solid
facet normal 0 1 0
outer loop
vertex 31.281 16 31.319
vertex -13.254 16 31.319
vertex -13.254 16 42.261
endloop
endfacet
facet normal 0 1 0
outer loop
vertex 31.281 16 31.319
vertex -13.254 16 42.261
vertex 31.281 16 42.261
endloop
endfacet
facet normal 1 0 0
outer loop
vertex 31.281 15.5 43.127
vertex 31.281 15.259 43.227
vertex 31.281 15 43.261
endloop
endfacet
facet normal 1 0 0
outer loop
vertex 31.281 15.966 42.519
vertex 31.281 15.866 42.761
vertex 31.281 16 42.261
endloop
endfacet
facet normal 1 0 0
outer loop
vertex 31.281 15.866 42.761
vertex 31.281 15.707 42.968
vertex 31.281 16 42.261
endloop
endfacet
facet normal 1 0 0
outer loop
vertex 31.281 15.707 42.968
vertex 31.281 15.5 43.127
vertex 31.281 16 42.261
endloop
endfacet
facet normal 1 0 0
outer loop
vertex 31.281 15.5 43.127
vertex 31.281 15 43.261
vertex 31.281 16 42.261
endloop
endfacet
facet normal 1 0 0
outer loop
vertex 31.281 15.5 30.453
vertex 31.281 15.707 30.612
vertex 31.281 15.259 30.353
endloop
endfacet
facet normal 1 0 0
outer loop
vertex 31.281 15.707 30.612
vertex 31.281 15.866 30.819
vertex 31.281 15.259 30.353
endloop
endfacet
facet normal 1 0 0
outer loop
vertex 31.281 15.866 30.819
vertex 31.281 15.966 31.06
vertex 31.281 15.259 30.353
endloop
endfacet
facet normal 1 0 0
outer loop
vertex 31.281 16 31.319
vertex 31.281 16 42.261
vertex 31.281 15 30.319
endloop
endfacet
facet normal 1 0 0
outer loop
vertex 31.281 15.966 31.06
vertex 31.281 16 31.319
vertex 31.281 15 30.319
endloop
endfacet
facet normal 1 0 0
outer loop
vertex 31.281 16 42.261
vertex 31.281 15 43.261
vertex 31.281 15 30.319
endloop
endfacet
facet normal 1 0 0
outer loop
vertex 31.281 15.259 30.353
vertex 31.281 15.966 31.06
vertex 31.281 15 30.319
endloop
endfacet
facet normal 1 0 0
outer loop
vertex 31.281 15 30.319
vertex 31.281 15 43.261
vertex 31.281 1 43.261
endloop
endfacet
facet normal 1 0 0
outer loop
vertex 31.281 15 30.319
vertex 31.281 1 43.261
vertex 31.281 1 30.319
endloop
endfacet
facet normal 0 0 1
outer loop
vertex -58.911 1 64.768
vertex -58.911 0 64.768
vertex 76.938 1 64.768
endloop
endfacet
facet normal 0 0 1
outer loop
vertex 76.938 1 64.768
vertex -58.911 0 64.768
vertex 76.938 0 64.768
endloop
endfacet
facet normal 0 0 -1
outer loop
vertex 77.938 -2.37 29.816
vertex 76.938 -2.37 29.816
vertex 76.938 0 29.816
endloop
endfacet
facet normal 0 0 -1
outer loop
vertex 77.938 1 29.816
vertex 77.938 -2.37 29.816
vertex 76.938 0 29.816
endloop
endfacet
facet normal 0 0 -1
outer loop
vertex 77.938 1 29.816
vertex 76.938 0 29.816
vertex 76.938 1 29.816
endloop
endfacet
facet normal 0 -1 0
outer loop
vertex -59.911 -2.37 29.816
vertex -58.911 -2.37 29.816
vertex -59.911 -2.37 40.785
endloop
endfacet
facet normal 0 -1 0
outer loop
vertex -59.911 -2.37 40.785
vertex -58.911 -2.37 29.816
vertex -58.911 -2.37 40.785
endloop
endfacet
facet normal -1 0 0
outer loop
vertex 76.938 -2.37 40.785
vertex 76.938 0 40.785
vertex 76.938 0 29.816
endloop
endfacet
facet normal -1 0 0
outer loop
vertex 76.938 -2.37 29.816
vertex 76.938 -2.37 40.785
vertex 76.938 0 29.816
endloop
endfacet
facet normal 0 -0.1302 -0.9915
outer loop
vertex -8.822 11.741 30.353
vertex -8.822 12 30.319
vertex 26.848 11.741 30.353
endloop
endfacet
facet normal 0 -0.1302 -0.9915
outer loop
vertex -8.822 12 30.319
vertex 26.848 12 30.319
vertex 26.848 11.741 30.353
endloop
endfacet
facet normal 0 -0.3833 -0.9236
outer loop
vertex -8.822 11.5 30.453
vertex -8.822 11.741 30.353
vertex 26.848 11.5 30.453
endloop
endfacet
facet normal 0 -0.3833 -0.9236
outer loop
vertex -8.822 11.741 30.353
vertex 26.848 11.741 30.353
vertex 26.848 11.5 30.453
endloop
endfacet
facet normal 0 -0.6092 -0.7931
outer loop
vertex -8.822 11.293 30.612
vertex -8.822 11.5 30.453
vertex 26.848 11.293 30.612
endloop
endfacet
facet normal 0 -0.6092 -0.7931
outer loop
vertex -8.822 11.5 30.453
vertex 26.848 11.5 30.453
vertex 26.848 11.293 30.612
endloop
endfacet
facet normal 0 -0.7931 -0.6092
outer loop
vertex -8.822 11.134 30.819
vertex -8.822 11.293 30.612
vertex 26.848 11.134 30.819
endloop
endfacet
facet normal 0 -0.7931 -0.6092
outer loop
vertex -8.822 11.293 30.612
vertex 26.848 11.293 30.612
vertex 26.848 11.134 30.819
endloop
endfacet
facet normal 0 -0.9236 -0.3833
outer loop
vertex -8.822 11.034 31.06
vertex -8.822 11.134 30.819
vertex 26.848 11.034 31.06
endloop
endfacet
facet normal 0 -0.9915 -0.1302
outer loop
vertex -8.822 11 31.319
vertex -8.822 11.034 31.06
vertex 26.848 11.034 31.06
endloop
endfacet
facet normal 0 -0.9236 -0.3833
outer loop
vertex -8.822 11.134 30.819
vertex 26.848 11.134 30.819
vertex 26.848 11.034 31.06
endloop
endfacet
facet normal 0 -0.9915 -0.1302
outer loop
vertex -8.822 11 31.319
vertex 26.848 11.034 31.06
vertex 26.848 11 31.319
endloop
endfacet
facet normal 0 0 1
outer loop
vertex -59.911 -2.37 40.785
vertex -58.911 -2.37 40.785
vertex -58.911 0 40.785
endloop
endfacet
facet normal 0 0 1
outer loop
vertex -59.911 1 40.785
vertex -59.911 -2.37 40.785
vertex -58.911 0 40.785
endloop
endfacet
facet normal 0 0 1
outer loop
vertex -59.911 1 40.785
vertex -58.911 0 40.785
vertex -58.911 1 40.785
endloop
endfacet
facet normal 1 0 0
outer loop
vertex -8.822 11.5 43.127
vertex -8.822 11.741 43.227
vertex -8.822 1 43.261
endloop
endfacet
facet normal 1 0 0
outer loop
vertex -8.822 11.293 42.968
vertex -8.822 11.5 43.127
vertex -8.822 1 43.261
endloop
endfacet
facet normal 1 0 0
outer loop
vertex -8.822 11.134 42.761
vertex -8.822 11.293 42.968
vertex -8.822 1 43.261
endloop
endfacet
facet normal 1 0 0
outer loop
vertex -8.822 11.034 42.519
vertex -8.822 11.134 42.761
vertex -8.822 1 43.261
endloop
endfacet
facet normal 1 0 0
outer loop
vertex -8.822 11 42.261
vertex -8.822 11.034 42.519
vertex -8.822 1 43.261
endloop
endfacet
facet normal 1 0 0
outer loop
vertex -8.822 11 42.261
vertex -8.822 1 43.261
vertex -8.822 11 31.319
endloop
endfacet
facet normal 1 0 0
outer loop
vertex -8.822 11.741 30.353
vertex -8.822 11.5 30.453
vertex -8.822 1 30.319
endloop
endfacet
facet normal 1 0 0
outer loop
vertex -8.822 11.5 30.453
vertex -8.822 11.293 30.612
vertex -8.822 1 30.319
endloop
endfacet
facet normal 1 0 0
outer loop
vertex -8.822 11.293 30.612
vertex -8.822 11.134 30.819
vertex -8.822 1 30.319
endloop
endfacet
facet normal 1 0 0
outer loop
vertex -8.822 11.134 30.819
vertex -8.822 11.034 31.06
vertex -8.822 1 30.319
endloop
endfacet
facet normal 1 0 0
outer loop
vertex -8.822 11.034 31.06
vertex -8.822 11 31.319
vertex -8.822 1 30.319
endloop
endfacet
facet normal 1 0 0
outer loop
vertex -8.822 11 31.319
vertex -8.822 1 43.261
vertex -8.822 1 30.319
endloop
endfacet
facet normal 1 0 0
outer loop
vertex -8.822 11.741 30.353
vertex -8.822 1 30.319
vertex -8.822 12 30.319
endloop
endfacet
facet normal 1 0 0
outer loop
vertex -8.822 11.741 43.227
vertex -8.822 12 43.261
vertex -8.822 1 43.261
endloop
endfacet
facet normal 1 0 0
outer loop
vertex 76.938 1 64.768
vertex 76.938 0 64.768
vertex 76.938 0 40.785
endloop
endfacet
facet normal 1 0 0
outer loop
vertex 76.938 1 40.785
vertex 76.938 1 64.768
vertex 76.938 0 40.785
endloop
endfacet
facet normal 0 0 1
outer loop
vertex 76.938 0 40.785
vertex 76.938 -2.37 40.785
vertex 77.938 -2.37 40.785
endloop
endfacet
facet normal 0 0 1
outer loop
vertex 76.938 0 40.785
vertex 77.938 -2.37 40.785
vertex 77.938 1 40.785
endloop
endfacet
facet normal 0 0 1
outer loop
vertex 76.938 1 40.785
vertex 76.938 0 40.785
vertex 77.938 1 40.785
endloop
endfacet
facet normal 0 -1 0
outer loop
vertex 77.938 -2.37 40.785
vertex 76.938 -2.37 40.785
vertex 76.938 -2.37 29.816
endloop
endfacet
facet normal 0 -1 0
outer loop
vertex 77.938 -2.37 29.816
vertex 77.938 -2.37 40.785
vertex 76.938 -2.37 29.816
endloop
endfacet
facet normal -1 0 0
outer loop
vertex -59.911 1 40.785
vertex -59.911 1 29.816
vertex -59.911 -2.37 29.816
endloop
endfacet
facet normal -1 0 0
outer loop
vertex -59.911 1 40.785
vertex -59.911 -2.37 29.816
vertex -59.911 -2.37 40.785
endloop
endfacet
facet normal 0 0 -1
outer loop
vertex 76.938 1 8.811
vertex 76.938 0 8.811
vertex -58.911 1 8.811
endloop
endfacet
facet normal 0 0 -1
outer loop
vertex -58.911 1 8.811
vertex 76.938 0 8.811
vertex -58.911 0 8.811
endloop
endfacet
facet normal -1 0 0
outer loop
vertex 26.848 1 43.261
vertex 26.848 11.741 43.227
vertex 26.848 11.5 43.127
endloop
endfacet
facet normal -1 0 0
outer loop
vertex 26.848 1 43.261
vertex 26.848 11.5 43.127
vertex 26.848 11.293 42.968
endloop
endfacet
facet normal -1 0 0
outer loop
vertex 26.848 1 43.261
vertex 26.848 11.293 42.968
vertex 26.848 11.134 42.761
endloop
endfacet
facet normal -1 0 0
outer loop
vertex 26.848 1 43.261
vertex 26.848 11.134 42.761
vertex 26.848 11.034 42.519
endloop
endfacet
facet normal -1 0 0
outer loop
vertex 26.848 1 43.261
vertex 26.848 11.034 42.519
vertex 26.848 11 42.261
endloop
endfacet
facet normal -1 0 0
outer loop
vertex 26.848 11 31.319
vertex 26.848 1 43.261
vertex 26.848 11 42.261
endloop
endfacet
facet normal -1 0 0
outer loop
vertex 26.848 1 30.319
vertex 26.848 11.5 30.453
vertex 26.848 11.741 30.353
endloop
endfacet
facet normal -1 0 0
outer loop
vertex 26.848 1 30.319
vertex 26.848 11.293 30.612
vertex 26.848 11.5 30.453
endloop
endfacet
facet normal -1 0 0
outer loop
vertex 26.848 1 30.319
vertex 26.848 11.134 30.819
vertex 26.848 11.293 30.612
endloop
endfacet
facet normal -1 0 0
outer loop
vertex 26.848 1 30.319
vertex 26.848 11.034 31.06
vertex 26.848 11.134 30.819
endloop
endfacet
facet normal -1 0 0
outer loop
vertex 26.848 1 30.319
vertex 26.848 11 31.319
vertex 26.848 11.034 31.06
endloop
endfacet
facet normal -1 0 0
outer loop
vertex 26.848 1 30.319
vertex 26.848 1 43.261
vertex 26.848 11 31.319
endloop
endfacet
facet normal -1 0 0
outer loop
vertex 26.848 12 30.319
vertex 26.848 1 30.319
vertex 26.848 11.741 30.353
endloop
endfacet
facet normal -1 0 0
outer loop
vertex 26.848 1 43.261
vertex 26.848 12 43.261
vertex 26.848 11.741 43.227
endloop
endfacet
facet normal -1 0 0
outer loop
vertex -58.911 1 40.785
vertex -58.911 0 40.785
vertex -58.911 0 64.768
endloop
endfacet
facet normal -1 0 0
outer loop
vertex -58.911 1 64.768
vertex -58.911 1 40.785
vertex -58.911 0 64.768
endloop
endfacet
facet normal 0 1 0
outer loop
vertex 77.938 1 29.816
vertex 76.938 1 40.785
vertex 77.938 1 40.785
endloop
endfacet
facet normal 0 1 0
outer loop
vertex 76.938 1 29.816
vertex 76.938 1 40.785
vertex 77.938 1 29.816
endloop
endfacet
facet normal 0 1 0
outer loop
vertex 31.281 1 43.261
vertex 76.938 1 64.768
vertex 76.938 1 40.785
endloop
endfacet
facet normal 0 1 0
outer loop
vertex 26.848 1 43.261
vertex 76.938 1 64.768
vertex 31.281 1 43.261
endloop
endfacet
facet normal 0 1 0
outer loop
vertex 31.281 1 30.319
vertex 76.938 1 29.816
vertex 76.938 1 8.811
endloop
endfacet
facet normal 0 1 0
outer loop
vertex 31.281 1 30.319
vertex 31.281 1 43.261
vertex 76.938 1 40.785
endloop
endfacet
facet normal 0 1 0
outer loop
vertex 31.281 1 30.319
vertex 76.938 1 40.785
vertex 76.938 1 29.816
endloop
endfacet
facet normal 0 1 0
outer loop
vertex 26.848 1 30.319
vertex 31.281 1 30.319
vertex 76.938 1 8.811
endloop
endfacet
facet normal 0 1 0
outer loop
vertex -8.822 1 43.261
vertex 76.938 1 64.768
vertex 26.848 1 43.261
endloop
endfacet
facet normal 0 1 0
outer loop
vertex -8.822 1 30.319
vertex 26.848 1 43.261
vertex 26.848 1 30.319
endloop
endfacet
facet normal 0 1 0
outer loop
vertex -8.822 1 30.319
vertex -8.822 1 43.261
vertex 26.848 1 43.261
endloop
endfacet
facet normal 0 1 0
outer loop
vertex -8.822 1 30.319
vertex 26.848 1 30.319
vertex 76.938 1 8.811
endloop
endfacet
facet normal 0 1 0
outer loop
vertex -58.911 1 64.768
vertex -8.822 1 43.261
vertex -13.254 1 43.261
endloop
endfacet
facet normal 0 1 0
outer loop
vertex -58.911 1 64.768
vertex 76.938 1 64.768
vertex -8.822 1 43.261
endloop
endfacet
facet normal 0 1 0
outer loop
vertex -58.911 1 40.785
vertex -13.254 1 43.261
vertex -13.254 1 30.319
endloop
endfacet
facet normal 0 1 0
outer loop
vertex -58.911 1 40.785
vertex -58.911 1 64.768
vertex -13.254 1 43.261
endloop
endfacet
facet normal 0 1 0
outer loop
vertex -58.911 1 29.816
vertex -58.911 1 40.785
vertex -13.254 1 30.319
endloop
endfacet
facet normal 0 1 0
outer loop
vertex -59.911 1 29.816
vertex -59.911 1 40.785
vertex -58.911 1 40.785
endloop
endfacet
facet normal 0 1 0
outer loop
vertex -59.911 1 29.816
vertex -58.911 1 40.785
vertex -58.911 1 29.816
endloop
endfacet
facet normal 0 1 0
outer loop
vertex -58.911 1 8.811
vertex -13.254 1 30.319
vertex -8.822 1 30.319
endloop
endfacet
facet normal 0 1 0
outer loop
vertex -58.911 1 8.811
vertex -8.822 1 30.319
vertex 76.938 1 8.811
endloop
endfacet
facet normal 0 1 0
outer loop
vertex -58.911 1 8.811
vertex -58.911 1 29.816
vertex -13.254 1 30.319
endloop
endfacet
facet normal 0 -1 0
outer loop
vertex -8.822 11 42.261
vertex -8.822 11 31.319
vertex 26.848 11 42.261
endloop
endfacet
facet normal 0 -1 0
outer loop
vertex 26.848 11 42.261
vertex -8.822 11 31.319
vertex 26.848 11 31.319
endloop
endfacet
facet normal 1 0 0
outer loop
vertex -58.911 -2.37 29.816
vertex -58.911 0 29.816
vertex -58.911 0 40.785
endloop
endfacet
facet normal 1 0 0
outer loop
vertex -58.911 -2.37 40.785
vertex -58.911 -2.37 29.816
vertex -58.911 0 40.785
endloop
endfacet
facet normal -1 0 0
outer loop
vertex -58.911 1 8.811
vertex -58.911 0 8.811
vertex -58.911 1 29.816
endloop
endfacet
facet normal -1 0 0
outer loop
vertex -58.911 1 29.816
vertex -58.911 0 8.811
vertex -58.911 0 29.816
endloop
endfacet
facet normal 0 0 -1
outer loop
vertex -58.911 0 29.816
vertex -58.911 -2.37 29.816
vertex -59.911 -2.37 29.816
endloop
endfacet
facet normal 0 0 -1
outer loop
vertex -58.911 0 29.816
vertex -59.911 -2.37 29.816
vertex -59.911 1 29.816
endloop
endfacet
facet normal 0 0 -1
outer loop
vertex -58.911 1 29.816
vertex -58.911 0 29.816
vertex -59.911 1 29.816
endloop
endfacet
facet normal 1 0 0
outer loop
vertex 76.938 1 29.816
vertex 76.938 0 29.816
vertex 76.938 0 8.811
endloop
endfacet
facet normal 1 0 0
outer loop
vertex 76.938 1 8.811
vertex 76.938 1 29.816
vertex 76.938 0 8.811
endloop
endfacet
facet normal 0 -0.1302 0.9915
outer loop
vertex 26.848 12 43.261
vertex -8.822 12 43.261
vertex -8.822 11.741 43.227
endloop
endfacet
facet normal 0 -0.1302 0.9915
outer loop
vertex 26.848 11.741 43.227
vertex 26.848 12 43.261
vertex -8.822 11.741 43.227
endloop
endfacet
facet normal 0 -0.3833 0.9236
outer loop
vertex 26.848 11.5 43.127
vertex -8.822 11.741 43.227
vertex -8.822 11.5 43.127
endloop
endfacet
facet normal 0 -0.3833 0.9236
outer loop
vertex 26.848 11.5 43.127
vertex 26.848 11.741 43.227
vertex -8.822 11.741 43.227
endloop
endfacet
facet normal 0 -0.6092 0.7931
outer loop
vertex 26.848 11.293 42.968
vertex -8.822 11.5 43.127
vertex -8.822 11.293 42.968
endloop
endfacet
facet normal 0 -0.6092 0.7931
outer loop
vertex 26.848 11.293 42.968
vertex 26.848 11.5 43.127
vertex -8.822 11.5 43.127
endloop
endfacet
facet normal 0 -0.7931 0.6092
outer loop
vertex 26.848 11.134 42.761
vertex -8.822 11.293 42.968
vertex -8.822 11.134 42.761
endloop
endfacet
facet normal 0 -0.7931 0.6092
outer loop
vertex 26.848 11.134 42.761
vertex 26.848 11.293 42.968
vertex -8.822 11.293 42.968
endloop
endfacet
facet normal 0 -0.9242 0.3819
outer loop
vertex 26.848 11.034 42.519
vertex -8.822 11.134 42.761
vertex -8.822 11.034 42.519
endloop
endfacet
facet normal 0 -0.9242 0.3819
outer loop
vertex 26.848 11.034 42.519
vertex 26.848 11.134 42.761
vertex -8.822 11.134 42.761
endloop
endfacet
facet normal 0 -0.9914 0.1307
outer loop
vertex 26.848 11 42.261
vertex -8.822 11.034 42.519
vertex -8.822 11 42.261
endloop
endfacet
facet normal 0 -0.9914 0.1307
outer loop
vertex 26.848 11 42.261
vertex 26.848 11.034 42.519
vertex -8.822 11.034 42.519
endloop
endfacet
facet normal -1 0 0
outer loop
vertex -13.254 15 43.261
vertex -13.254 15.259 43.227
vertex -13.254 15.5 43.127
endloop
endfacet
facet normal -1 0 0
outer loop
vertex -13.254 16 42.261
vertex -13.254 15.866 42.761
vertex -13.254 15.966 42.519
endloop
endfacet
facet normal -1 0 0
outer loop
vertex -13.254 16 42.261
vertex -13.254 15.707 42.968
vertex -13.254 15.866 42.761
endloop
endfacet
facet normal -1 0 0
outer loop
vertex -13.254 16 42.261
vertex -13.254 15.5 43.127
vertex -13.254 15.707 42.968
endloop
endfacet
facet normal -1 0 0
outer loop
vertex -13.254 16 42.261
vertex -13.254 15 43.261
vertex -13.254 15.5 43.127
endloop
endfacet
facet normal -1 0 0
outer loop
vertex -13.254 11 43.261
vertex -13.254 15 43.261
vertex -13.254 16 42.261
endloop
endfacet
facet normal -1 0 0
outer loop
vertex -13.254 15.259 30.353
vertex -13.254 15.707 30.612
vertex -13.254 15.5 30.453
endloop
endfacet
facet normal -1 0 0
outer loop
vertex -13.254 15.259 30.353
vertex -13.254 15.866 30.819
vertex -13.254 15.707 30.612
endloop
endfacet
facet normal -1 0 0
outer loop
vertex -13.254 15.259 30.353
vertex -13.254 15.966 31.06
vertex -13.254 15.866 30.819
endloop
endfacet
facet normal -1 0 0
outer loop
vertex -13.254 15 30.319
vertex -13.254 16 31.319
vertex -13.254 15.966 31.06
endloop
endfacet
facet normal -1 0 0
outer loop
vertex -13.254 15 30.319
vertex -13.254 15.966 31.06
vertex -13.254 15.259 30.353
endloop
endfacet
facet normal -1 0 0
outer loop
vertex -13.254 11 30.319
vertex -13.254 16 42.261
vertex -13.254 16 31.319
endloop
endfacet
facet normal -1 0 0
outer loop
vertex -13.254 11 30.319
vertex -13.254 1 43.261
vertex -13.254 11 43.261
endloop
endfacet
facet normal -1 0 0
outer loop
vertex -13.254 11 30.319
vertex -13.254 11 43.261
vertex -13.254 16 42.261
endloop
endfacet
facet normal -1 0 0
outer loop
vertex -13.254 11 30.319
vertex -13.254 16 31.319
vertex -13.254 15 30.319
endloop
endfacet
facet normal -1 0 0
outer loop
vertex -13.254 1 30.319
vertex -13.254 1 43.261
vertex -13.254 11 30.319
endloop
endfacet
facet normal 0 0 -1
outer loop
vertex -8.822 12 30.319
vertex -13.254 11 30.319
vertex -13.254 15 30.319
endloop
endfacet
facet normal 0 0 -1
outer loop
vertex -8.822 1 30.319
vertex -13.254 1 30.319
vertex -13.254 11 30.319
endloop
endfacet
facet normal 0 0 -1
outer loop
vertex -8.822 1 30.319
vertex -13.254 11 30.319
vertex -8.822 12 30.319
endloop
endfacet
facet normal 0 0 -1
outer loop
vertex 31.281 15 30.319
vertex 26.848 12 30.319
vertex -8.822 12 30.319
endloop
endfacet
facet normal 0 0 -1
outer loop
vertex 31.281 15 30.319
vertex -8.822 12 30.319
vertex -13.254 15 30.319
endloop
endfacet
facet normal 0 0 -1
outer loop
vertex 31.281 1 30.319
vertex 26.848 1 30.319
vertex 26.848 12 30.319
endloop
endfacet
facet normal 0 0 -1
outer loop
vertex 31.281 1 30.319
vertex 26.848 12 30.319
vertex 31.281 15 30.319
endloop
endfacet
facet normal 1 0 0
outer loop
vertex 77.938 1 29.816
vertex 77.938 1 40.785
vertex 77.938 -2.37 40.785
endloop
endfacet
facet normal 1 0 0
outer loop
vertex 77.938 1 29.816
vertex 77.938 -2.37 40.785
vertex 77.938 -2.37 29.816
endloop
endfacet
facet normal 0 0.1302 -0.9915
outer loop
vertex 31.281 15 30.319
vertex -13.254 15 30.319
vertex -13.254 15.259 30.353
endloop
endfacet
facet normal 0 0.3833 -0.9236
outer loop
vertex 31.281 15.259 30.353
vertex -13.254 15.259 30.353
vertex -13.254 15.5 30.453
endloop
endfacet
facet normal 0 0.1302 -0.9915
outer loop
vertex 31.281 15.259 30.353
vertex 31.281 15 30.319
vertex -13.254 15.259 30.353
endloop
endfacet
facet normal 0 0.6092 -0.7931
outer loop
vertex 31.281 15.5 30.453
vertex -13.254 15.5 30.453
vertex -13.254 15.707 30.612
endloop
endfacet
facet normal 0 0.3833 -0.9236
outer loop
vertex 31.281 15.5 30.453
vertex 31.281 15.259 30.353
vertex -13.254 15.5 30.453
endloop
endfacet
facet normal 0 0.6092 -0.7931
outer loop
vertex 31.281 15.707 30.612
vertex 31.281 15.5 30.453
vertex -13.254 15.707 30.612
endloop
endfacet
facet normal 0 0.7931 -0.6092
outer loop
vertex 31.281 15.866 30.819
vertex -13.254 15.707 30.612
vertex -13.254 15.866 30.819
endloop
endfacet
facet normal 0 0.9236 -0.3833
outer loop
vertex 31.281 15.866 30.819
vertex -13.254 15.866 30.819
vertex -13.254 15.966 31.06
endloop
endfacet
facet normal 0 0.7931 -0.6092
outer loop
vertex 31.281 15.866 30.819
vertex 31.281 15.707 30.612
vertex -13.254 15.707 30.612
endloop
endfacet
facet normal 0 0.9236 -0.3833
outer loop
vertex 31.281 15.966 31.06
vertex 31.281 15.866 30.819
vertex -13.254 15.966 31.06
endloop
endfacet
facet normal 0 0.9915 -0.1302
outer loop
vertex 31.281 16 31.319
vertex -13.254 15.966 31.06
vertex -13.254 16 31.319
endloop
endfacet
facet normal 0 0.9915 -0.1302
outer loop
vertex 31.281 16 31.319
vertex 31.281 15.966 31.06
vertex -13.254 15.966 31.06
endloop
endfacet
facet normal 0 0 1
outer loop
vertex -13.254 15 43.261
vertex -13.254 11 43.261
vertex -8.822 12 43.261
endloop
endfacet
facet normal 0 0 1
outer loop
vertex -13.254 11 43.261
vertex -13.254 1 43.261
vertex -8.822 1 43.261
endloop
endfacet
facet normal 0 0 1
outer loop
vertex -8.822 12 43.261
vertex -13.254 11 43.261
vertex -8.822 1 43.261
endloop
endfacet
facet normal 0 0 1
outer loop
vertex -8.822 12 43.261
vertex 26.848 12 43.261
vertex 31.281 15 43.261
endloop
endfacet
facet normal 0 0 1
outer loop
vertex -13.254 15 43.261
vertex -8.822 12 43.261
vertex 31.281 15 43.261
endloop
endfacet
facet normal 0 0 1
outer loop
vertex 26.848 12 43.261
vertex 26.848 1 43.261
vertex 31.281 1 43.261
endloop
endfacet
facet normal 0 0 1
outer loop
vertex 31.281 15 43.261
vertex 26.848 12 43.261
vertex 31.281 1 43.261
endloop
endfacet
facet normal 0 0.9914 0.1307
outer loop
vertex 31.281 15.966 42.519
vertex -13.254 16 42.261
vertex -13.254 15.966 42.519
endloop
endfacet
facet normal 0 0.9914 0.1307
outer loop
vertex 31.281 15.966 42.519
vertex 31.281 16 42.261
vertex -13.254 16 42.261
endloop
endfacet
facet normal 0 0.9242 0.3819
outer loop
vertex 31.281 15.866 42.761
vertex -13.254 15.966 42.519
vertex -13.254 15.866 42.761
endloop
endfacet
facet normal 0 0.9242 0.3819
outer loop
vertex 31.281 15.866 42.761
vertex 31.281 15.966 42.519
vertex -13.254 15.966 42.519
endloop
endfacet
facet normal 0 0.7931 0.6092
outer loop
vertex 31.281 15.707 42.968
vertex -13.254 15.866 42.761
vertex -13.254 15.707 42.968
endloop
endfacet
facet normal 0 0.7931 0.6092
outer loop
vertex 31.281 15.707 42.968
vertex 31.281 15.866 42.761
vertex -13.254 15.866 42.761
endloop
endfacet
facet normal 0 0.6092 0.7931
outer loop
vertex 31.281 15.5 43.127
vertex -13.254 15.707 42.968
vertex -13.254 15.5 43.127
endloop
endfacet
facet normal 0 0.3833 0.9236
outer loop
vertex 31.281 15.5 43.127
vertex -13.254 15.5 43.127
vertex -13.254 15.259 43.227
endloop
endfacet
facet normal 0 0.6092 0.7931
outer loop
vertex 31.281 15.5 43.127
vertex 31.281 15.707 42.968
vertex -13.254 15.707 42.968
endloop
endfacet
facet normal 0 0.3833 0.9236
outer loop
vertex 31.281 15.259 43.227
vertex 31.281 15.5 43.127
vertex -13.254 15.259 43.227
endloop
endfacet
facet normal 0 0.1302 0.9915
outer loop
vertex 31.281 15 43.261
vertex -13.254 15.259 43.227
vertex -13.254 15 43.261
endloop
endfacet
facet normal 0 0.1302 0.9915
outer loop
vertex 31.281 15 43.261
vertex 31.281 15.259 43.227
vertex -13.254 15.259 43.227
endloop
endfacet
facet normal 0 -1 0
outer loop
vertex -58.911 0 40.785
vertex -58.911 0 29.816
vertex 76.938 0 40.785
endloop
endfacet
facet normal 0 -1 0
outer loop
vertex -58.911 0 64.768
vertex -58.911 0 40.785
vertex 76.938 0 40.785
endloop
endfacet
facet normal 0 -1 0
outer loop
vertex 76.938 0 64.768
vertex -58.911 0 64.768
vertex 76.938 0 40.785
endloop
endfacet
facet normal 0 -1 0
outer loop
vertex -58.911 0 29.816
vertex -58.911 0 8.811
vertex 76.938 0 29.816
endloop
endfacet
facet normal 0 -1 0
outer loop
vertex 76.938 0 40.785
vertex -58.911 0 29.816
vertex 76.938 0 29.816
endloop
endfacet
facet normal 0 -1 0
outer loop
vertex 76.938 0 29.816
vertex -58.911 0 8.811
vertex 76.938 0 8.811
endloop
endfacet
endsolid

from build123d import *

# Parameters (mm, degrees)
BOSS_EXTRUDE1_DEPTH = 1
SKETCH3_W           = 4.432871169
SKETCH3_H           = 12.941954118
SKETCH3_W_2         = 4.432871168
BOSS_EXTRUDE4_DEPTH = 10
SKETCH4_W           = 44.535219178
SKETCH4_H           = 12.941954118
BOSS_EXTRUDE6_DEPTH = 5
FILLET3_R           = 1
FILLET4_R           = 1
SKETCH7_W           = 10.96861972
SKETCH7_H           = 3.370404632
BOSS_EXTRUDE7_DEPTH = 1
SKETCH9_W           = 10.96861972
SKETCH9_H           = 3.370404632
BOSS_EXTRUDE8_DEPTH = 1


with BuildPart() as part:
    # Sketch1 → Boss-Extrude1 (new body)
    with BuildSketch(Plane(origin=(0, 0, 0), x_dir=(1, 0, 0), z_dir=(0, 1, 0))):
        Polygon((76.937608383, -62.782038713), (76.937608383, -8.810873689), (-58.911197585, -8.810873689), (-58.911197585, -62.792119939), (-58.911197585, -64.768415651), (-56.350218844, -64.768415651), (74.598736982, -64.768415651), (76.937608383, -64.768415651), align=None)
    extrude(amount=BOSS_EXTRUDE1_DEPTH)

    # Sketch3 → Boss-Extrude4 (add)
    with BuildSketch(Plane(origin=(0, 1, 0), x_dir=(1, 0, 0), z_dir=(0, 1, 0))):
        with Locations((-11.037968606, -36.78964467)):
            Rectangle(SKETCH3_W, SKETCH3_H)
        with Locations((29.064379404, -36.78964467)):
            Rectangle(SKETCH3_W_2, SKETCH3_H)
    extrude(amount=BOSS_EXTRUDE4_DEPTH)

    # Sketch4 → Boss-Extrude6 (add)
    with BuildSketch(Plane(origin=(0, 11, 0), x_dir=(1, 0, 0), z_dir=(0, 1, 0))):
        with Locations((9.013205399, -36.78964467)):
            Rectangle(SKETCH4_W, SKETCH4_H)
    extrude(amount=BOSS_EXTRUDE6_DEPTH)

    # Fillet3
    fillet3_edges = [part.edges().sort_by_distance(p)[0] for p in [
        (9.013205399, 16, 30.318667611),
        (9.013205399, 16, 43.260621729),
    ]]
    fillet(fillet3_edges, radius=FILLET3_R)

    # Fillet4
    fillet4_edges = [part.edges().sort_by_distance(p)[0] for p in [
        (9.013205399, 11, 43.260621729),
        (9.013205399, 11, 30.318667611),
    ]]
    fillet(fillet4_edges, radius=FILLET4_R)

    # Sketch7 → Boss-Extrude7 (add)
    with BuildSketch(Plane.ZY.offset(58.911197585)):
        with Locations((35.300658133, -0.685202316)):
            Rectangle(SKETCH7_W, SKETCH7_H)
    extrude(amount=BOSS_EXTRUDE7_DEPTH)

    # Sketch9 → Boss-Extrude8 (add)
    with BuildSketch(Plane(origin=(76.937608383, 0, 0), x_dir=(0, 0, -1), z_dir=(1, 0, 0))):
        with Locations((-35.300658133, -0.685202316)):
            Rectangle(SKETCH9_W, SKETCH9_H)
    extrude(amount=BOSS_EXTRUDE8_DEPTH)


solid = part.part
